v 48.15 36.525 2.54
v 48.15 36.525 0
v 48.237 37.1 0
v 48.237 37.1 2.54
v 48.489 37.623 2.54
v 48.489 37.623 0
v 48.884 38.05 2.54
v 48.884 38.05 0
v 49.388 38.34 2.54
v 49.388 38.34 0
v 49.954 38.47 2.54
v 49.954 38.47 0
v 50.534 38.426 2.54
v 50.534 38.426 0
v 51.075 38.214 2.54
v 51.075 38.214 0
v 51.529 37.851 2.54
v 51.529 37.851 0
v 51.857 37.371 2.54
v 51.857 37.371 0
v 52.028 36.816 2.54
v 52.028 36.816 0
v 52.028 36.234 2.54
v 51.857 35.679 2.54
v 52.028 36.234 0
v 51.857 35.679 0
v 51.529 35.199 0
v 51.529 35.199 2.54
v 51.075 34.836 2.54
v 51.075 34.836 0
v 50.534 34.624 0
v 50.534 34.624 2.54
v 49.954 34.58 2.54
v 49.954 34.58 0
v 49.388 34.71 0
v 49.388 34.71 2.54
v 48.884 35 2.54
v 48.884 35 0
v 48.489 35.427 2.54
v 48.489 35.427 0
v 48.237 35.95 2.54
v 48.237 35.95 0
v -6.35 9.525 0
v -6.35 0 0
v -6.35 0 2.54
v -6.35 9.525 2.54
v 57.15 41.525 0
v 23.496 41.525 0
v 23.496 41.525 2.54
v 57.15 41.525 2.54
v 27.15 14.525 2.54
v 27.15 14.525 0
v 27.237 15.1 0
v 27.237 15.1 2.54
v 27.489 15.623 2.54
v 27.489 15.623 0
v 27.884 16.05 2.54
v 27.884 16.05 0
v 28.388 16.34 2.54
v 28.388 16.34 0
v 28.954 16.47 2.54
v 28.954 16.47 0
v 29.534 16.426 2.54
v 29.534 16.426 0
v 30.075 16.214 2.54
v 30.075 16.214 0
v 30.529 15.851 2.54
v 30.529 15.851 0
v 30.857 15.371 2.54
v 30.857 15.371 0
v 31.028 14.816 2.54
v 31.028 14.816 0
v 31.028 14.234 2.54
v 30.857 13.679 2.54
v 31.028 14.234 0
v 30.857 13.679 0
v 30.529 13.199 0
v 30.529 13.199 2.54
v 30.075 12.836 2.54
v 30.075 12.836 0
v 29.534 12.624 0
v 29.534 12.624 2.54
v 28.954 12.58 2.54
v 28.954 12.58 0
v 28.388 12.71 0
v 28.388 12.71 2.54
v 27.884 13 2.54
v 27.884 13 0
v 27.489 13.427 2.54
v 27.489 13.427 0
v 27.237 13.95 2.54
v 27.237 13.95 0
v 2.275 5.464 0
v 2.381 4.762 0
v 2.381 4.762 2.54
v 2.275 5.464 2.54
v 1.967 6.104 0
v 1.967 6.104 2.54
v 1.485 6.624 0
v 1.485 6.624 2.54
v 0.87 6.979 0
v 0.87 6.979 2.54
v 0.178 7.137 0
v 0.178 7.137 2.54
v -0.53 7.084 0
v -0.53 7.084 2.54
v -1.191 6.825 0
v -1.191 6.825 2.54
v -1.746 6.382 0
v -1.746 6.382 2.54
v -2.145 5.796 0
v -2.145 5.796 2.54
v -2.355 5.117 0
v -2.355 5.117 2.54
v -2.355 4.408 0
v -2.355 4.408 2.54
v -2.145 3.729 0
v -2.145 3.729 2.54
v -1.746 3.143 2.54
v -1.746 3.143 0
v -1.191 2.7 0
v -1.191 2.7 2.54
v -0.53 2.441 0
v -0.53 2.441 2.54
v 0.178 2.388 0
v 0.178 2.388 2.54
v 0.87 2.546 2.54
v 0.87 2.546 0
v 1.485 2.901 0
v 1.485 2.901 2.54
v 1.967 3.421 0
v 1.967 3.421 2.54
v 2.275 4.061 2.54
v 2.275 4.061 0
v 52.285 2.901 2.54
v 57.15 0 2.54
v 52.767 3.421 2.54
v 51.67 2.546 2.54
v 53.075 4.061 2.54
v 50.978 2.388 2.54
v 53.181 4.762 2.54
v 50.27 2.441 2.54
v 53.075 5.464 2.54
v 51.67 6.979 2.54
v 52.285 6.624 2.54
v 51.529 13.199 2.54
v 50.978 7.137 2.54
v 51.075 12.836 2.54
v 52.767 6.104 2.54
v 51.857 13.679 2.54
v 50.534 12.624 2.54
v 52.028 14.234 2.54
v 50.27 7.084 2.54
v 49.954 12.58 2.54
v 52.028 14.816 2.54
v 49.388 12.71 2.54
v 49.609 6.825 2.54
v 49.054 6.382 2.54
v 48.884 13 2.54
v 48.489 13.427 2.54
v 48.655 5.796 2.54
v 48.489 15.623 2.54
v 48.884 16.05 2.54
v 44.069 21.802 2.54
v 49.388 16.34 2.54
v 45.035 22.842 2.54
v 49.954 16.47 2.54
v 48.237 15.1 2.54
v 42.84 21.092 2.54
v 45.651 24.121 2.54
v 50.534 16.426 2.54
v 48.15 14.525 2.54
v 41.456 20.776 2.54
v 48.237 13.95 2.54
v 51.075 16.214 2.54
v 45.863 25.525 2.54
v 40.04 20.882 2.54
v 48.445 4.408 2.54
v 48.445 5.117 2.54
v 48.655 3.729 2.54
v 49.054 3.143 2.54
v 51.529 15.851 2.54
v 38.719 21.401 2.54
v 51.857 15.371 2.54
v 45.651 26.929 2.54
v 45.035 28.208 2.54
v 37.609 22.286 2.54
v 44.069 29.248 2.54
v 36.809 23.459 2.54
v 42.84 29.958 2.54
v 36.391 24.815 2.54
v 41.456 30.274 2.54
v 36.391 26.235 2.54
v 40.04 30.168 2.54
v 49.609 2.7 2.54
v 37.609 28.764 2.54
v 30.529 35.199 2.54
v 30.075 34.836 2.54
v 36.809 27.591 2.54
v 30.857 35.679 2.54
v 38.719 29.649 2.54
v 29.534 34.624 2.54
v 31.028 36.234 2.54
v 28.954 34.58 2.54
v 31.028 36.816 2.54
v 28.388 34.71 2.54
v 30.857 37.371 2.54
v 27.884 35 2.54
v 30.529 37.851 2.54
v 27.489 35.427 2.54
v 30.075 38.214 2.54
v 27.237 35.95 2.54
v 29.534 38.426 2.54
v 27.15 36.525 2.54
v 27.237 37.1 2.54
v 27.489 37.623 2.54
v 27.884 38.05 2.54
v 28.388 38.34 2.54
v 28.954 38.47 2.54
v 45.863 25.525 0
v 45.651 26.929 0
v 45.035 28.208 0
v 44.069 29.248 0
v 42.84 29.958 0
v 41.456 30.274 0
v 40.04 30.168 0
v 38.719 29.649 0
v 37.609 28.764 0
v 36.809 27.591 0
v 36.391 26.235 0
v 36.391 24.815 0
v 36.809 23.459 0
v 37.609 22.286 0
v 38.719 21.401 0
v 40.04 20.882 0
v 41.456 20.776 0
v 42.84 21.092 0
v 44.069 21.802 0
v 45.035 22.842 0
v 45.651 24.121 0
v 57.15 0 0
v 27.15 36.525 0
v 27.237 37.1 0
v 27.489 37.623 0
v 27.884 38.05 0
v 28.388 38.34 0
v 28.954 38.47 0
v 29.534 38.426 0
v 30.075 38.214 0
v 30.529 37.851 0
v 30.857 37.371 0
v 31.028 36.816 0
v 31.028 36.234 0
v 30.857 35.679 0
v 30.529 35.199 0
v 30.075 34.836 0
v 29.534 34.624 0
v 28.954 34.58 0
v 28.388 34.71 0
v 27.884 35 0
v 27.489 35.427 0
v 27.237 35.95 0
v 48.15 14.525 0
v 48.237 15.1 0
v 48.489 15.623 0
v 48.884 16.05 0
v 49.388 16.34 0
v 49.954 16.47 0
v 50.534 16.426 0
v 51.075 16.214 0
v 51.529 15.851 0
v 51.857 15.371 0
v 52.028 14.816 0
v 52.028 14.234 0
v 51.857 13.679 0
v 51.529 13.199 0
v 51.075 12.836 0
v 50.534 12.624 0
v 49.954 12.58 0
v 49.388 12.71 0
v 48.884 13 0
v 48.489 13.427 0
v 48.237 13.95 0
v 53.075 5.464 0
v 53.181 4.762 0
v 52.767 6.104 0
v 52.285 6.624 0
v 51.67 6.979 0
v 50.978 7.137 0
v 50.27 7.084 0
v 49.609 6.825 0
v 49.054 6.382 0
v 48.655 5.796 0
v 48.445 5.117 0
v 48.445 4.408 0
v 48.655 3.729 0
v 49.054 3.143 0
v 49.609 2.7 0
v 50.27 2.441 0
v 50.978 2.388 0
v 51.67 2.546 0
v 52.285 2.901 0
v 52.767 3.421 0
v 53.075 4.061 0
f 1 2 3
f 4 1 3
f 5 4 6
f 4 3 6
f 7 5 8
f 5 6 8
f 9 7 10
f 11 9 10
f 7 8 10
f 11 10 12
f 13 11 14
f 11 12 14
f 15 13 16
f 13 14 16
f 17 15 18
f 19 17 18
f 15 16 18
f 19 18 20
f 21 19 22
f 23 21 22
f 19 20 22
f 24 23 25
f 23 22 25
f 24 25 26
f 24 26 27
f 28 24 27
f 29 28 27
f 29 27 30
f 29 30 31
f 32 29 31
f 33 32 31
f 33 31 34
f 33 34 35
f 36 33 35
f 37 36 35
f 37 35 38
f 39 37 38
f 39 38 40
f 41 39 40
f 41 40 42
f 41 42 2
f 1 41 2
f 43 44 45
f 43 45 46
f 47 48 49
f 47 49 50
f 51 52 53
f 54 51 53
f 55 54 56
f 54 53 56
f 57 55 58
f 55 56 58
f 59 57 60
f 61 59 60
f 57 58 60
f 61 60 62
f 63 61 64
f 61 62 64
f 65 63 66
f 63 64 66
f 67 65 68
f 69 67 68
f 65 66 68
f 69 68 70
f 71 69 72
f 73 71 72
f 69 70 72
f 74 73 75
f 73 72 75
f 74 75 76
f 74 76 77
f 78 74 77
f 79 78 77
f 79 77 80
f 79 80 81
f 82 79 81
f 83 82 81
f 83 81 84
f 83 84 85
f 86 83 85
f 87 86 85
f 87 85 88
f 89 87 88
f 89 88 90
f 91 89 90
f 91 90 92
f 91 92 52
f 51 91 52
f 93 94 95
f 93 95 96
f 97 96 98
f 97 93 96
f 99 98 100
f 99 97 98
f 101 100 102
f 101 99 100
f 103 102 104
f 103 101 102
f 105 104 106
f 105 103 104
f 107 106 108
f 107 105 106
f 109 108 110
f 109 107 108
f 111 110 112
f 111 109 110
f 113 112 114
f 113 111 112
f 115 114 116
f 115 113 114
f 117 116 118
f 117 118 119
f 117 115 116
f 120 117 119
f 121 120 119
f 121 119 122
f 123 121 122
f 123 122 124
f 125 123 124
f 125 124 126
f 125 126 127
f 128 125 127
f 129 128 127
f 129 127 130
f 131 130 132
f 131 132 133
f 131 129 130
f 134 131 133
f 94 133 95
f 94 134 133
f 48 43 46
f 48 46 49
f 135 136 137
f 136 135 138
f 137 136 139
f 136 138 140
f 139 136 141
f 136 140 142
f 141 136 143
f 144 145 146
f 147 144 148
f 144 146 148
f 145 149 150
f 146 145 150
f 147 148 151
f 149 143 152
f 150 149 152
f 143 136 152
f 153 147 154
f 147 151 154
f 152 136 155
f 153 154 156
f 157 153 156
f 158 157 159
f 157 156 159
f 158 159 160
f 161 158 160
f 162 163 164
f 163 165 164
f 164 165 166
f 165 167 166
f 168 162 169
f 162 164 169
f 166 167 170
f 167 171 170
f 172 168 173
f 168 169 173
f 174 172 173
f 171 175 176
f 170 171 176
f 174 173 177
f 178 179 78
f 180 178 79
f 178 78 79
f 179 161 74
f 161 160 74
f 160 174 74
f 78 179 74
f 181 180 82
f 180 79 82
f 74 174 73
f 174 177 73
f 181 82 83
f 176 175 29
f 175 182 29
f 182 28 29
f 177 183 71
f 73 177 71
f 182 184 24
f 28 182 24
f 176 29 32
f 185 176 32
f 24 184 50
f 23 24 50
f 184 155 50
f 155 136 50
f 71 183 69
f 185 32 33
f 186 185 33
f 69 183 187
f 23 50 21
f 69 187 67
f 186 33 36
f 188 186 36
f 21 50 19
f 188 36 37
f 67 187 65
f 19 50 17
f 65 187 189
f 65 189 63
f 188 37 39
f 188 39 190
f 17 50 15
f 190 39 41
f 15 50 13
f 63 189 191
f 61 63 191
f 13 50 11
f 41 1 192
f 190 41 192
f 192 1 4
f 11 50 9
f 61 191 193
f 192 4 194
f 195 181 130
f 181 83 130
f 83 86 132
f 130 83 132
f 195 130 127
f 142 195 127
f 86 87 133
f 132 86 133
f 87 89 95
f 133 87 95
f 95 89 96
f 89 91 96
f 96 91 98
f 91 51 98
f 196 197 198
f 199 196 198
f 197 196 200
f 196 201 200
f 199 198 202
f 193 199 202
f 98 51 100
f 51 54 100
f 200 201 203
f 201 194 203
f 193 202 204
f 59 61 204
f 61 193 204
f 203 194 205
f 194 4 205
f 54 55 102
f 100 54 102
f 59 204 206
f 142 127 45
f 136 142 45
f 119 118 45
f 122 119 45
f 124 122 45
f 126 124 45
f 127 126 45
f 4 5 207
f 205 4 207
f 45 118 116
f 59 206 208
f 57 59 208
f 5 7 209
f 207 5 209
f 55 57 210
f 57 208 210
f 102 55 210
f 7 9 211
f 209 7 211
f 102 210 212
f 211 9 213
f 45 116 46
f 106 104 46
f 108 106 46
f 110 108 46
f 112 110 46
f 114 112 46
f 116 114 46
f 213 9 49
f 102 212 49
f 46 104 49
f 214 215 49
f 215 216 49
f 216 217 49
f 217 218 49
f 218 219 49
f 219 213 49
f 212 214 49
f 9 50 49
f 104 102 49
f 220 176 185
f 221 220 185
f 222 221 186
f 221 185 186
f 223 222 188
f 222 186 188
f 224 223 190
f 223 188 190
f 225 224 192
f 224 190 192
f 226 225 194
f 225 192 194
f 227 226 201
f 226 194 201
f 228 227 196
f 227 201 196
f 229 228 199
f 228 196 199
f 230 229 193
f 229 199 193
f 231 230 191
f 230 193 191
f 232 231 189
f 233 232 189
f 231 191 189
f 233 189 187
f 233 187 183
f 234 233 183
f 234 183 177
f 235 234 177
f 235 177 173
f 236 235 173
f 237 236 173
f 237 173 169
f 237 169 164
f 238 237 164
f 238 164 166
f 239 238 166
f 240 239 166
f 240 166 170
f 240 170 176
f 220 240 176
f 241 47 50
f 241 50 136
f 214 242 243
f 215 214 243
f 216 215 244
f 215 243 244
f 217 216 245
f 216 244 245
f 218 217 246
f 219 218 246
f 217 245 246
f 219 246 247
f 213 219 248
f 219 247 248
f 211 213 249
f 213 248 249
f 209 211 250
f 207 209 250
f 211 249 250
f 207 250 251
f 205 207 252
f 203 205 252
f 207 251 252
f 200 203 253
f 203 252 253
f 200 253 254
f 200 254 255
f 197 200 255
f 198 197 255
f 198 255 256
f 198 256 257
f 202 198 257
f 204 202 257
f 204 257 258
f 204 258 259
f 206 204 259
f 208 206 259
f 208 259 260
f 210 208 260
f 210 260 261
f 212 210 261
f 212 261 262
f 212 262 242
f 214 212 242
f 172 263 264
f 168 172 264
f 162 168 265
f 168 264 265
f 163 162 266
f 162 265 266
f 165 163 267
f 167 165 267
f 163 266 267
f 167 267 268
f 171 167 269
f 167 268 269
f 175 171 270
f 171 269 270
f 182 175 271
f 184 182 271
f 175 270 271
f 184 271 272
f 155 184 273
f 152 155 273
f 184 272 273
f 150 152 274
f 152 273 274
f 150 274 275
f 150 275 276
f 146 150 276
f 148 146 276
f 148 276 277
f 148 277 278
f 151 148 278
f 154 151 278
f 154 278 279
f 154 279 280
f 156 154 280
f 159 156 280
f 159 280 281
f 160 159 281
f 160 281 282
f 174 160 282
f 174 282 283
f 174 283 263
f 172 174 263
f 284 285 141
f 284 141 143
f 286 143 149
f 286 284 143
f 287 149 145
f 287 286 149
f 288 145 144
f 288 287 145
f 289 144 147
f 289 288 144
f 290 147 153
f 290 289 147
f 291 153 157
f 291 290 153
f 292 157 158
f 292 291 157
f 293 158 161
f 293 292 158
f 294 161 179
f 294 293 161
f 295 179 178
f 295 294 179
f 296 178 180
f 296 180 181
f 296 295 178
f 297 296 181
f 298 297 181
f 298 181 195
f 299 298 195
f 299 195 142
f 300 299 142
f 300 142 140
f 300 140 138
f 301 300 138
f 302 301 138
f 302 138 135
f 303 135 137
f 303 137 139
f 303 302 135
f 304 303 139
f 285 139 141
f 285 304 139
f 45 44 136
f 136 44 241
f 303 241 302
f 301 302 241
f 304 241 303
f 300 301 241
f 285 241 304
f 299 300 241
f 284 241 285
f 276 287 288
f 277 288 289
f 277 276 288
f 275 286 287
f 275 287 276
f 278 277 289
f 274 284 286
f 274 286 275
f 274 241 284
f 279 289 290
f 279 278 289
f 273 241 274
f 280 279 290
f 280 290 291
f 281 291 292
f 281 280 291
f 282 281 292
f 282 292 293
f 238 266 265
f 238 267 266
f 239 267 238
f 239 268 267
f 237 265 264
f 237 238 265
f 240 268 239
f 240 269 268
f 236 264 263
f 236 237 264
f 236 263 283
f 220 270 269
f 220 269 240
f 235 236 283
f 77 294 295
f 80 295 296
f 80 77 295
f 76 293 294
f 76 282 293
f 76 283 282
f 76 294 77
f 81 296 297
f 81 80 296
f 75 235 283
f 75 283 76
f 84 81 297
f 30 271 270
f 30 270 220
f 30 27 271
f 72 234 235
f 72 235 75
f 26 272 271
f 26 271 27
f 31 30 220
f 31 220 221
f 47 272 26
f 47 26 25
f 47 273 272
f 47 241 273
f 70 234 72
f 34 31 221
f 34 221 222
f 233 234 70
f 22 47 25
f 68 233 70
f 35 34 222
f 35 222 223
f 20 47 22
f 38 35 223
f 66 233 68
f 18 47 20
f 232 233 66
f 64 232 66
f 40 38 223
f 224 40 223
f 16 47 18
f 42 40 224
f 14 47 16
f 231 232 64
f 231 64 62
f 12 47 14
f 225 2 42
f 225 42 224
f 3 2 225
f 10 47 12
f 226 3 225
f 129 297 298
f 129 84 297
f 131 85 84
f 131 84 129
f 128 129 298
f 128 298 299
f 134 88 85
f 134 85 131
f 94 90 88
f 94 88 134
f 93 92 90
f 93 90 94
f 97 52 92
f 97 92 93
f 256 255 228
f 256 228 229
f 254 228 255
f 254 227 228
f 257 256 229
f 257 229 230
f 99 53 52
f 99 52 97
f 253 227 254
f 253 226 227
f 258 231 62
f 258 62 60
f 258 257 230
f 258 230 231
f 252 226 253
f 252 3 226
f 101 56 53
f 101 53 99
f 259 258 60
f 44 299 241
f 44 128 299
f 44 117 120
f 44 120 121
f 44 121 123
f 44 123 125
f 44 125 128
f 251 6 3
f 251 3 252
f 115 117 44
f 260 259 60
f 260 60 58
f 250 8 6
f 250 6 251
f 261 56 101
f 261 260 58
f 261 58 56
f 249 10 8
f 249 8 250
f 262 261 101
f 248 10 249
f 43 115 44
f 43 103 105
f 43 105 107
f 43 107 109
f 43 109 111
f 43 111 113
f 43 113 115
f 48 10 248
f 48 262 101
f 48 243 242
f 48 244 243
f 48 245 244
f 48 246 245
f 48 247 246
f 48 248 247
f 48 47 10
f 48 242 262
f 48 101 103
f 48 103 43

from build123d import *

# Parameters (mm, degrees)
SKETCH1_R                  = 2.38125
BOSS_EXTRUDE1_DEPTH        = 2.54
M3_5_CLEARANCE_HOLE1_D     = 3.9
M3_5_CLEARANCE_HOLE1_DEPTH = 12.7
M3_5_CLEARANCE_HOLE1_TIP   = 1.171678207
SKETCH5_R                  = 4.7625
CUT_EXTRUDE1_DEPTH         = 71.688752465


with BuildPart() as part:
    # Sketch1 → Boss-Extrude1 (new body)
    with BuildSketch(Plane.XY):
        Polygon((-6.35, 9.525), (23.496082005, 41.525), (57.15, 41.525), (57.15, 0), (44.45, 0), (6.35, 0), (-6.35, 0), align=None)
        with Locations((0, 4.7625)):
            Circle(SKETCH1_R, mode=Mode.SUBTRACT)
        with Locations((50.8, 4.7625)):
            Circle(SKETCH1_R, mode=Mode.SUBTRACT)
    extrude(amount=BOSS_EXTRUDE1_DEPTH)

    # M3.5 Clearance Hole1
    with Locations(Plane.XY.offset(2.54)):
        with Locations((29.1, 36.525), (50.1, 36.525), (50.1, 14.525), (29.1, 14.525)):
            Hole(M3_5_CLEARANCE_HOLE1_D / 2, depth=M3_5_CLEARANCE_HOLE1_DEPTH)
            with Locations((0, 0, -(M3_5_CLEARANCE_HOLE1_DEPTH + M3_5_CLEARANCE_HOLE1_TIP / 2))):  # 118° drill point
                Cone(0, M3_5_CLEARANCE_HOLE1_D / 2, M3_5_CLEARANCE_HOLE1_TIP, mode=Mode.SUBTRACT)

    # Sketch5 → Cut-Extrude1 (cut, through all)
    with BuildSketch(Plane.XY.offset(2.54)):
        with Locations((41.1, 25.525)):
            Circle(SKETCH5_R)
    extrude(amount=-CUT_EXTRUDE1_DEPTH, mode=Mode.SUBTRACT)


solid = part.part
